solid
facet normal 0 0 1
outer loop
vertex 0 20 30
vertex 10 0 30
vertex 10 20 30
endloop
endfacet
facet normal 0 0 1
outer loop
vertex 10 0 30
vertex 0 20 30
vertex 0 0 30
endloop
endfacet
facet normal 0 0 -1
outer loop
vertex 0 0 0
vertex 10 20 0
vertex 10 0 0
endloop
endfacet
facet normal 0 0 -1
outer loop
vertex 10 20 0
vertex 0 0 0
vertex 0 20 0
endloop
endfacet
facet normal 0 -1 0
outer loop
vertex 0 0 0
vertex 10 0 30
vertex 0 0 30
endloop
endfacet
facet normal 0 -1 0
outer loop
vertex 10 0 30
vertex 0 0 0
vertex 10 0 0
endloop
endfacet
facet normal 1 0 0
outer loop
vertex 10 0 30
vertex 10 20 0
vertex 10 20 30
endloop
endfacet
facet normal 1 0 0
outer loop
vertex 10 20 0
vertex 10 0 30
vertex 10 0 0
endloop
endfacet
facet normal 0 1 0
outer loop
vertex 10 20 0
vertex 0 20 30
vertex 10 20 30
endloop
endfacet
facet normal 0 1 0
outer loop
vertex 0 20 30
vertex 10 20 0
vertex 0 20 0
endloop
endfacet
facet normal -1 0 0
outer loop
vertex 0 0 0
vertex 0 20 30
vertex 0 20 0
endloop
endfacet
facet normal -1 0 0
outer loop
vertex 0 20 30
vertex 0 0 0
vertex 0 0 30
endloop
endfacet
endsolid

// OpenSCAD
Longueur   = 10;
Largeur    = 20;
Profondeur = 30;
MonTexte   = "Bravo! votre pièce est prête!";
cube([Longueur,Largeur,Profondeur]);
echo(MonTexte);
